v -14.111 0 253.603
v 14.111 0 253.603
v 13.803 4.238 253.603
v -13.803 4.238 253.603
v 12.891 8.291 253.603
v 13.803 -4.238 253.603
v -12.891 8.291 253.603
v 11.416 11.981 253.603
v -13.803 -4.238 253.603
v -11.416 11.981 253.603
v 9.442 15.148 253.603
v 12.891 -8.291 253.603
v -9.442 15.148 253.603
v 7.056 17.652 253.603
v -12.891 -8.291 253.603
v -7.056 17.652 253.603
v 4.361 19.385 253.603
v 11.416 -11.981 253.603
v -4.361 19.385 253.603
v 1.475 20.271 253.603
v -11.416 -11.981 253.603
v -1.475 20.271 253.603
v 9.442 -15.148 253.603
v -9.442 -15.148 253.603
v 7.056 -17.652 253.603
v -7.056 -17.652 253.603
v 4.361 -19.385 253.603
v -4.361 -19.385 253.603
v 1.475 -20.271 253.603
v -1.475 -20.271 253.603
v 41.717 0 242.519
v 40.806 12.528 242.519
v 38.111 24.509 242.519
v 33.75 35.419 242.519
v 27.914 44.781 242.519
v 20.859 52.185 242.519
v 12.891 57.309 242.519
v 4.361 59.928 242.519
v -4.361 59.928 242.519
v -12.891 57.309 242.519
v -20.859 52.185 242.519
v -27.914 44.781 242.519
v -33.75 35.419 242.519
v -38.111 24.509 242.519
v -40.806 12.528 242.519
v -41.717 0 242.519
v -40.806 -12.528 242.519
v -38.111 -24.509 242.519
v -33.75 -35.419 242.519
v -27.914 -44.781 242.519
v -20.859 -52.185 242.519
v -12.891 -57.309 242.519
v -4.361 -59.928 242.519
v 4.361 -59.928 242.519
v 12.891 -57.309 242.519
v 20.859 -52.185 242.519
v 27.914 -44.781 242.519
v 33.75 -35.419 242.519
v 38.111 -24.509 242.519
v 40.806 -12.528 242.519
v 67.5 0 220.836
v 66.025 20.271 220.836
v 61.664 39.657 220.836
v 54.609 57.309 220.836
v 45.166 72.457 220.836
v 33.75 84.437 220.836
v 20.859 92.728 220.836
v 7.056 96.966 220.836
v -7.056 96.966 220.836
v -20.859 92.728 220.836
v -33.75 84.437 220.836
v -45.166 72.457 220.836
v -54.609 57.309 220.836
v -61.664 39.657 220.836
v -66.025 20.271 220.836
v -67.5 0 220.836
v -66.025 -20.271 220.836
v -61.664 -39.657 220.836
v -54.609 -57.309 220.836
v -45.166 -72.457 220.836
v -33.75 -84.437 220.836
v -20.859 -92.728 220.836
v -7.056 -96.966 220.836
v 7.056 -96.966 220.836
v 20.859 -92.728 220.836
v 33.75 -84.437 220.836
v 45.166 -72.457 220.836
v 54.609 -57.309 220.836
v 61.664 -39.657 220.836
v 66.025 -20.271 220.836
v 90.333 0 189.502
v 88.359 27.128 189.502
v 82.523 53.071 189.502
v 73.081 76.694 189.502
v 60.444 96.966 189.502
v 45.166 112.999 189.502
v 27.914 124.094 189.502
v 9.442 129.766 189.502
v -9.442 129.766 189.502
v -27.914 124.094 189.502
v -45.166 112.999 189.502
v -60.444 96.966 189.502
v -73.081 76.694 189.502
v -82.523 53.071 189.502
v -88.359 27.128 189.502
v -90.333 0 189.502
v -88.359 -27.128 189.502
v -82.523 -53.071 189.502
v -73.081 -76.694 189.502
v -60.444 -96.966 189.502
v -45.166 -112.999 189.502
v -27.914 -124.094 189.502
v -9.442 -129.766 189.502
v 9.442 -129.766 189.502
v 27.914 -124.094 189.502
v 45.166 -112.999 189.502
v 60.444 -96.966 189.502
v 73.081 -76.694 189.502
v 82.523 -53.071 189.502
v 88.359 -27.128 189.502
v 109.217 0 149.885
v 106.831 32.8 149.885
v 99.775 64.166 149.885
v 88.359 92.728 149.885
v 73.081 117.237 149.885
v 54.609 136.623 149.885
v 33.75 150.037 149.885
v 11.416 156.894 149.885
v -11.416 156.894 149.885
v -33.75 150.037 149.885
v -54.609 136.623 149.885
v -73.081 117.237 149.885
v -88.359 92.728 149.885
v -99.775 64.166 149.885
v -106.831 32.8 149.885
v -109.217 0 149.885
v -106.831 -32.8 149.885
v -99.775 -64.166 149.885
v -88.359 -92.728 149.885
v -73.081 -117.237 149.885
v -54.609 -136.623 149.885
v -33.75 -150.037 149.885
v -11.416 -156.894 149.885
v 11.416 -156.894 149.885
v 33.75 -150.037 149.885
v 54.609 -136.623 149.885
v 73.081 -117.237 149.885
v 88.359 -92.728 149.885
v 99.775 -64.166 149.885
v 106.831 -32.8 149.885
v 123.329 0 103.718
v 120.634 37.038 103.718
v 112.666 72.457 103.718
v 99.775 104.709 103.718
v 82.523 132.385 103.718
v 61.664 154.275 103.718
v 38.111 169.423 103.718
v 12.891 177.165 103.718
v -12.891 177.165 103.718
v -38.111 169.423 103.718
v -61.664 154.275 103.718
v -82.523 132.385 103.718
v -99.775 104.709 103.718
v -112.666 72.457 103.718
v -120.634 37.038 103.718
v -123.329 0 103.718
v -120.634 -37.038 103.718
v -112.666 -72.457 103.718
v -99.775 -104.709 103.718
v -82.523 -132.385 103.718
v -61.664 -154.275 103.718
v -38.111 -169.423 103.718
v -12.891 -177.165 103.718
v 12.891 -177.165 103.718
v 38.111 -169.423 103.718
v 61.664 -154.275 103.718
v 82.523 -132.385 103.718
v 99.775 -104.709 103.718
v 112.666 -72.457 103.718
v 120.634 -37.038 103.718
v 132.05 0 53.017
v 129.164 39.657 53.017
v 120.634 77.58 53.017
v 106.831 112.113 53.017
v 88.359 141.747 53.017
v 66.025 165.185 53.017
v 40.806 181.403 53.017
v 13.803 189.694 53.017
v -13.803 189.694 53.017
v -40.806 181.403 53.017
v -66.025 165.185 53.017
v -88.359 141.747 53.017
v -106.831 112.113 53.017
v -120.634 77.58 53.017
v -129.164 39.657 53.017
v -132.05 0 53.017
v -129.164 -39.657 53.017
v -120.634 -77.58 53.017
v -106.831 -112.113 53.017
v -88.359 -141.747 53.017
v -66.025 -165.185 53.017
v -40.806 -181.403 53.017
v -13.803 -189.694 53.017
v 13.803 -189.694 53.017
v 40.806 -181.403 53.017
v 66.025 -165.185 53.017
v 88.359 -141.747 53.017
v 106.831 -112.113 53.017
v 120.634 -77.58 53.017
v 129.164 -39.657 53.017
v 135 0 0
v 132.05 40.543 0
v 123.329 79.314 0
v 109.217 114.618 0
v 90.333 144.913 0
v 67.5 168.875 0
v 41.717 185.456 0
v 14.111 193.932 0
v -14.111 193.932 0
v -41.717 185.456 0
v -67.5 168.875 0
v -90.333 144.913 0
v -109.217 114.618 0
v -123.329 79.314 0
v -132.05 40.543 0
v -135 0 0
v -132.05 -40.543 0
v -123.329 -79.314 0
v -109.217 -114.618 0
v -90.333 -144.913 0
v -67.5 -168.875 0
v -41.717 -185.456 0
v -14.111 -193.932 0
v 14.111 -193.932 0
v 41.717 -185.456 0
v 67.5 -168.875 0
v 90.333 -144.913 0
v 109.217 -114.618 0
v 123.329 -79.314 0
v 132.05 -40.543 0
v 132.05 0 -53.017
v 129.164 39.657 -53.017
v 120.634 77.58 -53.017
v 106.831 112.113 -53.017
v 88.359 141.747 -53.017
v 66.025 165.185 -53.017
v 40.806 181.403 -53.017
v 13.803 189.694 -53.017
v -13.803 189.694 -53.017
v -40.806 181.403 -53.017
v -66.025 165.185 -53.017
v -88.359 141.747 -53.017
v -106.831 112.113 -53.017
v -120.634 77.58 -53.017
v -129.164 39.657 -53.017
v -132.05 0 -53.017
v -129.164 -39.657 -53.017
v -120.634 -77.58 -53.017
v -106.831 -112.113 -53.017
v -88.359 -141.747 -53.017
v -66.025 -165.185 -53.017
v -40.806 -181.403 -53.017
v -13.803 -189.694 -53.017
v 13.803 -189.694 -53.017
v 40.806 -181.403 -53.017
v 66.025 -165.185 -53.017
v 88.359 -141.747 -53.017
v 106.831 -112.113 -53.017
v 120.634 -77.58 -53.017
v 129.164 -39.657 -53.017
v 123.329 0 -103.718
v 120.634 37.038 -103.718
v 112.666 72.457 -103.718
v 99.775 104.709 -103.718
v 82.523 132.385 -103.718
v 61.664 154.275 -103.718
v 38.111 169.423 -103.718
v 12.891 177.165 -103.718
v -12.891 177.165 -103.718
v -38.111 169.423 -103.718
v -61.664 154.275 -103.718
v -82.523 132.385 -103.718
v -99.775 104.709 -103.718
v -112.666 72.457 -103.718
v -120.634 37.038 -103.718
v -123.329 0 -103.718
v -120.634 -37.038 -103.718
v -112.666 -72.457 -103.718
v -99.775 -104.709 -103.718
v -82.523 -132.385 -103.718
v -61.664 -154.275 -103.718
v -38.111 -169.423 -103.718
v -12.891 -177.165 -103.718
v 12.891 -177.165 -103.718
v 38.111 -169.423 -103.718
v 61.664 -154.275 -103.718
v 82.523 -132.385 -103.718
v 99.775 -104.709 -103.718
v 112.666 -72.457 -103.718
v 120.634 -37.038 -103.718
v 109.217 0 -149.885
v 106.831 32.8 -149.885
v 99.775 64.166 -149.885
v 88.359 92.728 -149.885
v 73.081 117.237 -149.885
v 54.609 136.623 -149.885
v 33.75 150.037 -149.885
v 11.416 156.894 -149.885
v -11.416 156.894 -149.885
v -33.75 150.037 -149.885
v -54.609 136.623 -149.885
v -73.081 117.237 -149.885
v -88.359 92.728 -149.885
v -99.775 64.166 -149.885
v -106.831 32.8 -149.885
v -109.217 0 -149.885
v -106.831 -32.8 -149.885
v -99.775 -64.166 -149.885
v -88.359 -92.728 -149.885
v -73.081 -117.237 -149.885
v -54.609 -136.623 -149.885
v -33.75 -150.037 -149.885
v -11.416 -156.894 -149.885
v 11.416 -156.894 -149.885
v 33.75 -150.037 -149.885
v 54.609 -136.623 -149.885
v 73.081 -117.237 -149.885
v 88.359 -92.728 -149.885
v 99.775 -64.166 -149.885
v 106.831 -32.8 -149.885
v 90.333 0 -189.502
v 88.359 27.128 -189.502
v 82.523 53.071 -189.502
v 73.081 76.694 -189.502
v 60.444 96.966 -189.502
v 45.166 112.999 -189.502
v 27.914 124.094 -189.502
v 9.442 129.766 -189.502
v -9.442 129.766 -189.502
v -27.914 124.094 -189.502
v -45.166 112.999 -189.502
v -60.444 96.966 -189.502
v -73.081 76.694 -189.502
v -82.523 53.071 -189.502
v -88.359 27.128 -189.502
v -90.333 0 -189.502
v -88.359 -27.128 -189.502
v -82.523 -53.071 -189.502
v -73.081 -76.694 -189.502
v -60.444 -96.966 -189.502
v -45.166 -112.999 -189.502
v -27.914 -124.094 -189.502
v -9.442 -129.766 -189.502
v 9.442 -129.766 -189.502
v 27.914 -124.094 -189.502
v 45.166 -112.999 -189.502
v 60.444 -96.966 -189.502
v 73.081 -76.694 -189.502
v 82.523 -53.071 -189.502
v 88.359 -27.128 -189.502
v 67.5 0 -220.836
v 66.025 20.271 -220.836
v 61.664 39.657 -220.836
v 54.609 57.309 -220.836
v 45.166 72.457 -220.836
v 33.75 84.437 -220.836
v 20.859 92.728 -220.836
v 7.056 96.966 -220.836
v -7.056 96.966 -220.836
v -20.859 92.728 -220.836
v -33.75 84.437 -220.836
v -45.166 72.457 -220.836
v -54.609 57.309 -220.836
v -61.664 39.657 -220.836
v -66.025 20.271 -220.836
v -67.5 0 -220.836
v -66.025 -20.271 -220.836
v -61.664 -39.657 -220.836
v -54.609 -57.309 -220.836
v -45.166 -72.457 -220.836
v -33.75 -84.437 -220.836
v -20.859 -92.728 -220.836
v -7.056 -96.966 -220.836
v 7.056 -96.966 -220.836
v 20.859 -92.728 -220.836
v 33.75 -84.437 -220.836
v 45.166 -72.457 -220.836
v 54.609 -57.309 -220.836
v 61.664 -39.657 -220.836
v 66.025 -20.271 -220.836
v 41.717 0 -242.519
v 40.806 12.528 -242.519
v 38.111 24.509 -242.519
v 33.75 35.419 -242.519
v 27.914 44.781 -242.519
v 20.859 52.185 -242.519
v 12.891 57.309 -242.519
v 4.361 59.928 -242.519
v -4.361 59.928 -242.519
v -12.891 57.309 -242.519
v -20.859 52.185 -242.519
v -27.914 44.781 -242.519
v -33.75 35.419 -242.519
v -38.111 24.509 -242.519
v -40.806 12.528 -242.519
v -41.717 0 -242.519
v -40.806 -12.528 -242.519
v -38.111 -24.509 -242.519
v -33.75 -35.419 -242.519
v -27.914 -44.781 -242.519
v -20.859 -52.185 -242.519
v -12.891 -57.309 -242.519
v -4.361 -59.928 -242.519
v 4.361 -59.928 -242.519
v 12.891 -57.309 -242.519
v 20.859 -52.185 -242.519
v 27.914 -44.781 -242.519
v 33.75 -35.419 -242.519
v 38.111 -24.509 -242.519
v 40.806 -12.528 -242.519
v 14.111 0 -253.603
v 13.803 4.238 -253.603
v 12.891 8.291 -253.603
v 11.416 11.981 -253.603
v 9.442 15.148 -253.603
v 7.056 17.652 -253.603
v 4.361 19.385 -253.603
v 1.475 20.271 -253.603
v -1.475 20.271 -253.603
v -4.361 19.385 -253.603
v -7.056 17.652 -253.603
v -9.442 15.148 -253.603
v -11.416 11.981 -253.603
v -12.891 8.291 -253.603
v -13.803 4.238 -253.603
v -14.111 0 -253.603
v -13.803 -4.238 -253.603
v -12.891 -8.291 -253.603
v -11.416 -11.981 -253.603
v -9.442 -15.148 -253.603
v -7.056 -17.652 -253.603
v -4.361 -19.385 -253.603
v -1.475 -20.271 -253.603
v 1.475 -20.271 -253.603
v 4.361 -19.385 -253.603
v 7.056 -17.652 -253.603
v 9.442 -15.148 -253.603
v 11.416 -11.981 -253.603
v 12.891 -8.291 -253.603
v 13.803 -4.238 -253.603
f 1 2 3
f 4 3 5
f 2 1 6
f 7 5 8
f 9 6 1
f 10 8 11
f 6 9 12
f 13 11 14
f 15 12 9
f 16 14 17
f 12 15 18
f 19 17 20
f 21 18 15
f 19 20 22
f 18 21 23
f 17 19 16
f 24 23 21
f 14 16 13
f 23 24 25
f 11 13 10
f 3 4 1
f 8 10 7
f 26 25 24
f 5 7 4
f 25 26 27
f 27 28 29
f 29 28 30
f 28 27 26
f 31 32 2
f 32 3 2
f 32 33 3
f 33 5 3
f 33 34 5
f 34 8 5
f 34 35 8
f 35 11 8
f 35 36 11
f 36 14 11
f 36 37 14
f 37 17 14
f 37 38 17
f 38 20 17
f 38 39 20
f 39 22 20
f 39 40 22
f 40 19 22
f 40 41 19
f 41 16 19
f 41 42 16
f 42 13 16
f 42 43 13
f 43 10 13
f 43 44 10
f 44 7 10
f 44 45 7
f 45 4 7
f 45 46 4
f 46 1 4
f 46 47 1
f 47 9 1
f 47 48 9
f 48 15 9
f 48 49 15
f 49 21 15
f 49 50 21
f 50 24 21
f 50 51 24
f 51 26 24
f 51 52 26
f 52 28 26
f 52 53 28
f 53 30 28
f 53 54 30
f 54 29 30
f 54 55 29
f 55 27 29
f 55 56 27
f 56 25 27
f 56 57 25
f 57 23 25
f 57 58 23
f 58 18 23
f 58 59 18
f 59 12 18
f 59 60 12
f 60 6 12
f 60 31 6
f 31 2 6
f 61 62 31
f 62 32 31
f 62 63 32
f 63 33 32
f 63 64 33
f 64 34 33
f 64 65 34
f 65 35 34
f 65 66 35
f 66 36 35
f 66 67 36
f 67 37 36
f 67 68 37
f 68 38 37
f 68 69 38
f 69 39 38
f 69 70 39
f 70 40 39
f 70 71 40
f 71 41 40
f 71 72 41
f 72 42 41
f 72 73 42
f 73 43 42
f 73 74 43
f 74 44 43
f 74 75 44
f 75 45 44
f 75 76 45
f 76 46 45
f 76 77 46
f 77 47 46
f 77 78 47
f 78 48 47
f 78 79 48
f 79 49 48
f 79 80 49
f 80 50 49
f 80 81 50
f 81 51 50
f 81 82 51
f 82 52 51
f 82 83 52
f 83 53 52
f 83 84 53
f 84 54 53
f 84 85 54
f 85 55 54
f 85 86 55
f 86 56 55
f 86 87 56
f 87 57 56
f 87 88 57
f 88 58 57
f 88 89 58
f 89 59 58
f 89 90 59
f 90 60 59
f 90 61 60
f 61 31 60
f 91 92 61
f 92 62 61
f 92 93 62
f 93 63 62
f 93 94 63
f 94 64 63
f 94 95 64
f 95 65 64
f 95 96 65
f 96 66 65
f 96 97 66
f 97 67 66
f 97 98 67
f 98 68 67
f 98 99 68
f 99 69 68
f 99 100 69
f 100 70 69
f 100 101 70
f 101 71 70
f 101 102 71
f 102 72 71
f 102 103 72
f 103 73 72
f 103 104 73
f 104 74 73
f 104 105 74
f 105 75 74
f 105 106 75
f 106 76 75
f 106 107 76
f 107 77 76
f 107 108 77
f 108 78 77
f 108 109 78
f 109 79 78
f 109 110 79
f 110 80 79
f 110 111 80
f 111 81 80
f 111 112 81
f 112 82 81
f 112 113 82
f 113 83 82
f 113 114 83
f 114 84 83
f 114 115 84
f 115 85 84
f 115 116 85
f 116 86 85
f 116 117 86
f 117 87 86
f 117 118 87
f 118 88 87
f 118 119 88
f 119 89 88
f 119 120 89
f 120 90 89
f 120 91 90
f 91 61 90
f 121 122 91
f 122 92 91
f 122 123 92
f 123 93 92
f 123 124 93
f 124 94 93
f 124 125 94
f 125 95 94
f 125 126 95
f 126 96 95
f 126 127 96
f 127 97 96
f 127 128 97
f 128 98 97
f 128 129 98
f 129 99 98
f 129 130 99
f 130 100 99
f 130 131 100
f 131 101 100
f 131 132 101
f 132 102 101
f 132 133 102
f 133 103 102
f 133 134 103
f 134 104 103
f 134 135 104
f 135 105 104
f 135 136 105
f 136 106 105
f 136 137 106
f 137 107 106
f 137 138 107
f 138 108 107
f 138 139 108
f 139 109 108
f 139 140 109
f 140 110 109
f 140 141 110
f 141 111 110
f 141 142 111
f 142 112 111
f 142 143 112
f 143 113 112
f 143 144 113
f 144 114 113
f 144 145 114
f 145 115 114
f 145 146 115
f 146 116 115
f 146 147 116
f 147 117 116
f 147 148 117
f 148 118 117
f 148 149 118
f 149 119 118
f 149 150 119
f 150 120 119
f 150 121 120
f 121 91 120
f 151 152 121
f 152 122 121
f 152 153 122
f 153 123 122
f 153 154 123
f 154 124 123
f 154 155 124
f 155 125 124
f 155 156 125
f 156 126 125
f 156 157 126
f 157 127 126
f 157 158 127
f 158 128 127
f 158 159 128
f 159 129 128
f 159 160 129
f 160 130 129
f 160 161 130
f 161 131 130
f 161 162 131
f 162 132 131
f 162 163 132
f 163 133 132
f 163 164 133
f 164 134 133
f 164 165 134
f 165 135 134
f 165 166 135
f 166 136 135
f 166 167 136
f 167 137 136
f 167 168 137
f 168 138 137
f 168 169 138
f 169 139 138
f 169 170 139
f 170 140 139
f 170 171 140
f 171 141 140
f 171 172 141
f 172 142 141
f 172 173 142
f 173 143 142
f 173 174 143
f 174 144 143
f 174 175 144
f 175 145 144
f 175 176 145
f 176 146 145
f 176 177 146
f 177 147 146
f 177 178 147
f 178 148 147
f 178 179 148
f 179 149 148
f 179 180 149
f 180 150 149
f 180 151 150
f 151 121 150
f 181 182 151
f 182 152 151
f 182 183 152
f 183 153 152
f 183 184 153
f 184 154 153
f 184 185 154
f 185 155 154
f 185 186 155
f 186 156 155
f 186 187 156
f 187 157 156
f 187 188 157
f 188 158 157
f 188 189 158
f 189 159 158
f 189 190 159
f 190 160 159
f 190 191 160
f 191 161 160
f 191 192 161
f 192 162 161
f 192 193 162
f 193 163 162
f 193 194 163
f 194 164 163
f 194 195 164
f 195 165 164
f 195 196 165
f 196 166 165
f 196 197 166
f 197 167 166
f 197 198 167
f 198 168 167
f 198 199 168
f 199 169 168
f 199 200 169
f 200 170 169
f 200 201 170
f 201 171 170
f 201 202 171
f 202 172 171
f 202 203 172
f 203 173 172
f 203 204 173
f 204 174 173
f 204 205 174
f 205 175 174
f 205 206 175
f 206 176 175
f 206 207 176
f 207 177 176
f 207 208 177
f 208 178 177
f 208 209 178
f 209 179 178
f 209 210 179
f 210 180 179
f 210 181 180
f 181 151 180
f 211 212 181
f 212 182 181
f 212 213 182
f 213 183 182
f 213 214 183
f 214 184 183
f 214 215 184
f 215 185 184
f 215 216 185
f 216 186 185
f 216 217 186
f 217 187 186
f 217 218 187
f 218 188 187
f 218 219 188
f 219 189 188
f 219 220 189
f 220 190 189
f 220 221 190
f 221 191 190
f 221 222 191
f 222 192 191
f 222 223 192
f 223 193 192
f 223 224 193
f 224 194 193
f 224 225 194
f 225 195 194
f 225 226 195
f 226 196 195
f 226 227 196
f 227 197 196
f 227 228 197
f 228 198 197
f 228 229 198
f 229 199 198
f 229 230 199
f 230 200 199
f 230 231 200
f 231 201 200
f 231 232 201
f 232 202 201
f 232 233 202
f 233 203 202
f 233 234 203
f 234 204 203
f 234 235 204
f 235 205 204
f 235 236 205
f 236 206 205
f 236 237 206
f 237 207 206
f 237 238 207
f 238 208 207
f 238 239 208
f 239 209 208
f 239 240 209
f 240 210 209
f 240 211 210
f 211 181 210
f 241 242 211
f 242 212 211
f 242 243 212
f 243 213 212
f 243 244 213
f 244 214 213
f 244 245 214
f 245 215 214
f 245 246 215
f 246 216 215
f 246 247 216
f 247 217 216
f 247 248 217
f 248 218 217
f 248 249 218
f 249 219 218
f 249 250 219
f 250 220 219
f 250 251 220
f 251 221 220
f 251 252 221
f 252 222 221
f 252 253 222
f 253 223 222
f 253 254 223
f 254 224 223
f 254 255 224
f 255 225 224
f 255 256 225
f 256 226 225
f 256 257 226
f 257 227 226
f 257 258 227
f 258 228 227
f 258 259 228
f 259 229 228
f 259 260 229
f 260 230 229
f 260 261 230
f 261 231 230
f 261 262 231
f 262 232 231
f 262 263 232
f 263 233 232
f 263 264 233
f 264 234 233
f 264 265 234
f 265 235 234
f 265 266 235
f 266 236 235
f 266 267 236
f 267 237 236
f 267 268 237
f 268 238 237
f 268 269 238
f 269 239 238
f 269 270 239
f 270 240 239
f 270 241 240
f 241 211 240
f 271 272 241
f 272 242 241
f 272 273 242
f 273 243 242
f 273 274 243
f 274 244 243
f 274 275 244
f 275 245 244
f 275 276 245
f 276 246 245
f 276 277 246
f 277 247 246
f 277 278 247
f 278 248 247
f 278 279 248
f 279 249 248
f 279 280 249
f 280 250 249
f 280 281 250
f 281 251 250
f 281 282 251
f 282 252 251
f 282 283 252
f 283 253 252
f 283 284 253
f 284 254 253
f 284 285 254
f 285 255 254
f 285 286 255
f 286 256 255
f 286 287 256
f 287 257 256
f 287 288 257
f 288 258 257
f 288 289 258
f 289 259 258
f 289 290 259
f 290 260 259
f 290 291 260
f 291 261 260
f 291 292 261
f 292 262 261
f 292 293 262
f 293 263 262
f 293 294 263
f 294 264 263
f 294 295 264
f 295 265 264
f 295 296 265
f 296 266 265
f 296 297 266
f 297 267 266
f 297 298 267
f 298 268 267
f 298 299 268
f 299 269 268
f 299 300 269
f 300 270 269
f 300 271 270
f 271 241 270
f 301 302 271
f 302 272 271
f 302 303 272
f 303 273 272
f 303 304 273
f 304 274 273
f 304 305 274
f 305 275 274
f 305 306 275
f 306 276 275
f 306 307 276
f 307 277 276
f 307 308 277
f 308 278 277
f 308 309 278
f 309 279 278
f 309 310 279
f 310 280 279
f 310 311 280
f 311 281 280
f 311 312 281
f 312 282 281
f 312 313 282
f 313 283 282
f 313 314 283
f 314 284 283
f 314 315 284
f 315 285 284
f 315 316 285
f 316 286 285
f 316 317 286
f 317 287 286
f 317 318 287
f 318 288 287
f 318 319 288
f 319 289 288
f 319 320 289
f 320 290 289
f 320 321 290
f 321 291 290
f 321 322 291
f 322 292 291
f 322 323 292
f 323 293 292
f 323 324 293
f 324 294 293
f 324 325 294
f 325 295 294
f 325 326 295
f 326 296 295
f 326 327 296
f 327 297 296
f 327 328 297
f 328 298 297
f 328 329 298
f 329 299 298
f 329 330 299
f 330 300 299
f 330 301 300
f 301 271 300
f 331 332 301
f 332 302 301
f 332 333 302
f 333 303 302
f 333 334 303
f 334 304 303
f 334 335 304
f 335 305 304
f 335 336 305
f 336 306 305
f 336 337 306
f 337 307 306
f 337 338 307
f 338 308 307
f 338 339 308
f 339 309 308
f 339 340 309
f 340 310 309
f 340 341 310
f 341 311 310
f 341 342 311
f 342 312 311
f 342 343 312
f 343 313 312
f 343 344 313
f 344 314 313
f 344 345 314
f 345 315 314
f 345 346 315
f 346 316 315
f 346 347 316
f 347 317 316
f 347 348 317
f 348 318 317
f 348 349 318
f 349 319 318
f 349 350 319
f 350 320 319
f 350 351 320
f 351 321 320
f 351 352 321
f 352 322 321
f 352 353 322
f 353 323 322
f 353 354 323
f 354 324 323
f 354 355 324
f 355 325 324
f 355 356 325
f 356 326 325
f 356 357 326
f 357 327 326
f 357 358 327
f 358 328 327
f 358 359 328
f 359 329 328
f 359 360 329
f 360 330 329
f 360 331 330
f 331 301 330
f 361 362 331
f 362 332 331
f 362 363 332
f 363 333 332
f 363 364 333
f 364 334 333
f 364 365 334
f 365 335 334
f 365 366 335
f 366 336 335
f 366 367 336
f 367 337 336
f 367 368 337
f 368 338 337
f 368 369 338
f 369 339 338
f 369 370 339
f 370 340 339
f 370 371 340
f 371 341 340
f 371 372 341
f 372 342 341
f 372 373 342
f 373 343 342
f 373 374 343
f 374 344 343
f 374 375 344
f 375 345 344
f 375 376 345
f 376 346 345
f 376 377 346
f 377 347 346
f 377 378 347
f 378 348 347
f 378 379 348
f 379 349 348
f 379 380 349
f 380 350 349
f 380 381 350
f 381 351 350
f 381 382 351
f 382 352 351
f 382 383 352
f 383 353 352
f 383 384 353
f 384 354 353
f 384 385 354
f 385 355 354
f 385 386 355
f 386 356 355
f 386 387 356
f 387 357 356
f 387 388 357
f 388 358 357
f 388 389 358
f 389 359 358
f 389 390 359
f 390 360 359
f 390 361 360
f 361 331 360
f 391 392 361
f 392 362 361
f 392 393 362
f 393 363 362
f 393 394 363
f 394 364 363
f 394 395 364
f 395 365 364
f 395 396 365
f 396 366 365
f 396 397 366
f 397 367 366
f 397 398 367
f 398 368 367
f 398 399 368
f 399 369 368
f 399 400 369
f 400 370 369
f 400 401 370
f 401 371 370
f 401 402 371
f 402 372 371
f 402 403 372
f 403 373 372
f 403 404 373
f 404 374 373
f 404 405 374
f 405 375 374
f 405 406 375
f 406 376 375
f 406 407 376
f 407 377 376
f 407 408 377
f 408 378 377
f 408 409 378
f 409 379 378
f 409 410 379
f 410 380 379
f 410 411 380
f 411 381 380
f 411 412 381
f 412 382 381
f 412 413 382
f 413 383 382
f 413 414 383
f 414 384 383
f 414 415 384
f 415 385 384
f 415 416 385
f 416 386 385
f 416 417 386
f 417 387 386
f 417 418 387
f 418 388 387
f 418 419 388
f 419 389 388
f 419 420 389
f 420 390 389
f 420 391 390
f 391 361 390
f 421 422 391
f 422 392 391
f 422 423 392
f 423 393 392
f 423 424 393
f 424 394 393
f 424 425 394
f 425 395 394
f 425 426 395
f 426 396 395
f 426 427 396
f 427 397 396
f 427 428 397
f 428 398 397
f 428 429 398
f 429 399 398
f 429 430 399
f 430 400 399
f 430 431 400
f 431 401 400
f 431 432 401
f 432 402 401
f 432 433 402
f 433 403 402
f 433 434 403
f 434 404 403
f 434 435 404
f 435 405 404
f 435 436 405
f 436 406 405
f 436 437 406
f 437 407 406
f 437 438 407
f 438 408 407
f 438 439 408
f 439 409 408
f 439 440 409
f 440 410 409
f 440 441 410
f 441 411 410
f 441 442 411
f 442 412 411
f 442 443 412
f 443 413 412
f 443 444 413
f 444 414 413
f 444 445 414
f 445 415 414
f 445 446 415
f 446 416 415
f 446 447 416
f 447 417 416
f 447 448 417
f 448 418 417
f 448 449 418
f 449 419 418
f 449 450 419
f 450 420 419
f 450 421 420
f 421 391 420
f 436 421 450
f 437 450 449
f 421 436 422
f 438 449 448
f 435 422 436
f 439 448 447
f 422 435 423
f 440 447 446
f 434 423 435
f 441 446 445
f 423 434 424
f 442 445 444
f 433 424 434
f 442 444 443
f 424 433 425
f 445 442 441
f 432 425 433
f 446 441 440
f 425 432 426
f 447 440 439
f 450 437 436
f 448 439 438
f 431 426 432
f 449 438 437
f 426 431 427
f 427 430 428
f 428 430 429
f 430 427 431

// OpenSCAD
// Generated by SolidPython 1.0.1 on 2020-07-29 00:46:49


scale(v = [9, 13, 17]) {
	sphere(r = 15);
}
/***********************************************
*********      SolidPython code:      **********
************************************************
 
# import packages: SolidPython
from solid import *
from solid.utils import *
from itertools import chain, combinations, permutations


class Resize:

    def __init__(self, scad_file):
        self.scad_file = scad_file
        #self.scad_file = import_scad(scad_file)
        # cone/cylinder param:
        self.r1 = 0
        self.r2 = 0
        self.h = 0
        # rectangular prism param:
        self.w = 0
        self.l = 0
        # ellipse param:
        self.r = 0

    # import OpenScad code (file name corresponds to shape)


    # classify shape + parameters
    def assign(self, param1, param2, param3):
        if self.scad_file == 'cone.scad':
            self.r1 = param1
            self.r2 = param2
            self.h = param3
        elif self.scad_file == 'cylinder.scad':
            self.r1 = param1
            self.r2 = param2
            self.h = param3
        elif self.scad_file == 'rectangularPrism.scad':
            self.h = param1
            self.l = param2
            self.w = param3
        else:
            self.r = param1
            self.h = param2

    # resize parameters
    def iterate(self):
        x = range(3, 20, 2)
        i = 1
        if self.scad_file == 'cone.scad':
            tempList = list(permutations(x, 2))
            for temp in tempList:
                param1 = temp[0]
                param2 = temp[1]
                filepath = 'produced_scad_files/' + 'cone' + str(param1) + '_' + str(param2) + '_' + '.scad'
                scad_render_to_file(cylinder(h=param1, r1=param2, r2=0), filepath)

        elif self.scad_file == 'cylinder.scad':
            tempList = list(permutations(x, 3))
            for temp in tempList:
                param1 = temp[0]
                param2 = temp[1]
                filepath = 'produced_scad_files/' + 'cylinder' + str(param1) + '_' + str(param2) + '_' + '.scad'
                scad_render_to_file(cylinder(h=param1, r1=param2, r2=param2), filepath)

        elif self.scad_file == 'rectangularPrism.scad':
            tempList = list(permutations(x, 3))
            for temp in tempList:
                param1 = temp[0]
                param2 = temp[1]
                param3 = temp[2]
                filepath = 'produced_scad_files/' + 'rectangularPrism' + str(param1) + '_' + str(param2) + '_' + str(
                    param3) + '.scad'
                scad_render_to_file(cube(size=(param1, param2, param3)), filepath)

        elif self.scad_file == 'ellipse.scad':
            tempList = list(permutations(x, 4))
            for temp in tempList:
                param1 = temp[0]
                param2 = temp[1]
                param3 = temp[2]
                param4 = temp[3]
                filepath = 'produced_scad_files/' + 'ellipse' + str(param1) + '_' + str(param2) + '_' + str(param3) + '_' + str(param4) + '.scad'
                scad_render_to_file(scale([param1, param2, param3])(sphere(r=param4)), filepath)

    def render_to_scadfile(self):
        scad_render_to_file(scad, 'example.scad') 
 
************************************************/
